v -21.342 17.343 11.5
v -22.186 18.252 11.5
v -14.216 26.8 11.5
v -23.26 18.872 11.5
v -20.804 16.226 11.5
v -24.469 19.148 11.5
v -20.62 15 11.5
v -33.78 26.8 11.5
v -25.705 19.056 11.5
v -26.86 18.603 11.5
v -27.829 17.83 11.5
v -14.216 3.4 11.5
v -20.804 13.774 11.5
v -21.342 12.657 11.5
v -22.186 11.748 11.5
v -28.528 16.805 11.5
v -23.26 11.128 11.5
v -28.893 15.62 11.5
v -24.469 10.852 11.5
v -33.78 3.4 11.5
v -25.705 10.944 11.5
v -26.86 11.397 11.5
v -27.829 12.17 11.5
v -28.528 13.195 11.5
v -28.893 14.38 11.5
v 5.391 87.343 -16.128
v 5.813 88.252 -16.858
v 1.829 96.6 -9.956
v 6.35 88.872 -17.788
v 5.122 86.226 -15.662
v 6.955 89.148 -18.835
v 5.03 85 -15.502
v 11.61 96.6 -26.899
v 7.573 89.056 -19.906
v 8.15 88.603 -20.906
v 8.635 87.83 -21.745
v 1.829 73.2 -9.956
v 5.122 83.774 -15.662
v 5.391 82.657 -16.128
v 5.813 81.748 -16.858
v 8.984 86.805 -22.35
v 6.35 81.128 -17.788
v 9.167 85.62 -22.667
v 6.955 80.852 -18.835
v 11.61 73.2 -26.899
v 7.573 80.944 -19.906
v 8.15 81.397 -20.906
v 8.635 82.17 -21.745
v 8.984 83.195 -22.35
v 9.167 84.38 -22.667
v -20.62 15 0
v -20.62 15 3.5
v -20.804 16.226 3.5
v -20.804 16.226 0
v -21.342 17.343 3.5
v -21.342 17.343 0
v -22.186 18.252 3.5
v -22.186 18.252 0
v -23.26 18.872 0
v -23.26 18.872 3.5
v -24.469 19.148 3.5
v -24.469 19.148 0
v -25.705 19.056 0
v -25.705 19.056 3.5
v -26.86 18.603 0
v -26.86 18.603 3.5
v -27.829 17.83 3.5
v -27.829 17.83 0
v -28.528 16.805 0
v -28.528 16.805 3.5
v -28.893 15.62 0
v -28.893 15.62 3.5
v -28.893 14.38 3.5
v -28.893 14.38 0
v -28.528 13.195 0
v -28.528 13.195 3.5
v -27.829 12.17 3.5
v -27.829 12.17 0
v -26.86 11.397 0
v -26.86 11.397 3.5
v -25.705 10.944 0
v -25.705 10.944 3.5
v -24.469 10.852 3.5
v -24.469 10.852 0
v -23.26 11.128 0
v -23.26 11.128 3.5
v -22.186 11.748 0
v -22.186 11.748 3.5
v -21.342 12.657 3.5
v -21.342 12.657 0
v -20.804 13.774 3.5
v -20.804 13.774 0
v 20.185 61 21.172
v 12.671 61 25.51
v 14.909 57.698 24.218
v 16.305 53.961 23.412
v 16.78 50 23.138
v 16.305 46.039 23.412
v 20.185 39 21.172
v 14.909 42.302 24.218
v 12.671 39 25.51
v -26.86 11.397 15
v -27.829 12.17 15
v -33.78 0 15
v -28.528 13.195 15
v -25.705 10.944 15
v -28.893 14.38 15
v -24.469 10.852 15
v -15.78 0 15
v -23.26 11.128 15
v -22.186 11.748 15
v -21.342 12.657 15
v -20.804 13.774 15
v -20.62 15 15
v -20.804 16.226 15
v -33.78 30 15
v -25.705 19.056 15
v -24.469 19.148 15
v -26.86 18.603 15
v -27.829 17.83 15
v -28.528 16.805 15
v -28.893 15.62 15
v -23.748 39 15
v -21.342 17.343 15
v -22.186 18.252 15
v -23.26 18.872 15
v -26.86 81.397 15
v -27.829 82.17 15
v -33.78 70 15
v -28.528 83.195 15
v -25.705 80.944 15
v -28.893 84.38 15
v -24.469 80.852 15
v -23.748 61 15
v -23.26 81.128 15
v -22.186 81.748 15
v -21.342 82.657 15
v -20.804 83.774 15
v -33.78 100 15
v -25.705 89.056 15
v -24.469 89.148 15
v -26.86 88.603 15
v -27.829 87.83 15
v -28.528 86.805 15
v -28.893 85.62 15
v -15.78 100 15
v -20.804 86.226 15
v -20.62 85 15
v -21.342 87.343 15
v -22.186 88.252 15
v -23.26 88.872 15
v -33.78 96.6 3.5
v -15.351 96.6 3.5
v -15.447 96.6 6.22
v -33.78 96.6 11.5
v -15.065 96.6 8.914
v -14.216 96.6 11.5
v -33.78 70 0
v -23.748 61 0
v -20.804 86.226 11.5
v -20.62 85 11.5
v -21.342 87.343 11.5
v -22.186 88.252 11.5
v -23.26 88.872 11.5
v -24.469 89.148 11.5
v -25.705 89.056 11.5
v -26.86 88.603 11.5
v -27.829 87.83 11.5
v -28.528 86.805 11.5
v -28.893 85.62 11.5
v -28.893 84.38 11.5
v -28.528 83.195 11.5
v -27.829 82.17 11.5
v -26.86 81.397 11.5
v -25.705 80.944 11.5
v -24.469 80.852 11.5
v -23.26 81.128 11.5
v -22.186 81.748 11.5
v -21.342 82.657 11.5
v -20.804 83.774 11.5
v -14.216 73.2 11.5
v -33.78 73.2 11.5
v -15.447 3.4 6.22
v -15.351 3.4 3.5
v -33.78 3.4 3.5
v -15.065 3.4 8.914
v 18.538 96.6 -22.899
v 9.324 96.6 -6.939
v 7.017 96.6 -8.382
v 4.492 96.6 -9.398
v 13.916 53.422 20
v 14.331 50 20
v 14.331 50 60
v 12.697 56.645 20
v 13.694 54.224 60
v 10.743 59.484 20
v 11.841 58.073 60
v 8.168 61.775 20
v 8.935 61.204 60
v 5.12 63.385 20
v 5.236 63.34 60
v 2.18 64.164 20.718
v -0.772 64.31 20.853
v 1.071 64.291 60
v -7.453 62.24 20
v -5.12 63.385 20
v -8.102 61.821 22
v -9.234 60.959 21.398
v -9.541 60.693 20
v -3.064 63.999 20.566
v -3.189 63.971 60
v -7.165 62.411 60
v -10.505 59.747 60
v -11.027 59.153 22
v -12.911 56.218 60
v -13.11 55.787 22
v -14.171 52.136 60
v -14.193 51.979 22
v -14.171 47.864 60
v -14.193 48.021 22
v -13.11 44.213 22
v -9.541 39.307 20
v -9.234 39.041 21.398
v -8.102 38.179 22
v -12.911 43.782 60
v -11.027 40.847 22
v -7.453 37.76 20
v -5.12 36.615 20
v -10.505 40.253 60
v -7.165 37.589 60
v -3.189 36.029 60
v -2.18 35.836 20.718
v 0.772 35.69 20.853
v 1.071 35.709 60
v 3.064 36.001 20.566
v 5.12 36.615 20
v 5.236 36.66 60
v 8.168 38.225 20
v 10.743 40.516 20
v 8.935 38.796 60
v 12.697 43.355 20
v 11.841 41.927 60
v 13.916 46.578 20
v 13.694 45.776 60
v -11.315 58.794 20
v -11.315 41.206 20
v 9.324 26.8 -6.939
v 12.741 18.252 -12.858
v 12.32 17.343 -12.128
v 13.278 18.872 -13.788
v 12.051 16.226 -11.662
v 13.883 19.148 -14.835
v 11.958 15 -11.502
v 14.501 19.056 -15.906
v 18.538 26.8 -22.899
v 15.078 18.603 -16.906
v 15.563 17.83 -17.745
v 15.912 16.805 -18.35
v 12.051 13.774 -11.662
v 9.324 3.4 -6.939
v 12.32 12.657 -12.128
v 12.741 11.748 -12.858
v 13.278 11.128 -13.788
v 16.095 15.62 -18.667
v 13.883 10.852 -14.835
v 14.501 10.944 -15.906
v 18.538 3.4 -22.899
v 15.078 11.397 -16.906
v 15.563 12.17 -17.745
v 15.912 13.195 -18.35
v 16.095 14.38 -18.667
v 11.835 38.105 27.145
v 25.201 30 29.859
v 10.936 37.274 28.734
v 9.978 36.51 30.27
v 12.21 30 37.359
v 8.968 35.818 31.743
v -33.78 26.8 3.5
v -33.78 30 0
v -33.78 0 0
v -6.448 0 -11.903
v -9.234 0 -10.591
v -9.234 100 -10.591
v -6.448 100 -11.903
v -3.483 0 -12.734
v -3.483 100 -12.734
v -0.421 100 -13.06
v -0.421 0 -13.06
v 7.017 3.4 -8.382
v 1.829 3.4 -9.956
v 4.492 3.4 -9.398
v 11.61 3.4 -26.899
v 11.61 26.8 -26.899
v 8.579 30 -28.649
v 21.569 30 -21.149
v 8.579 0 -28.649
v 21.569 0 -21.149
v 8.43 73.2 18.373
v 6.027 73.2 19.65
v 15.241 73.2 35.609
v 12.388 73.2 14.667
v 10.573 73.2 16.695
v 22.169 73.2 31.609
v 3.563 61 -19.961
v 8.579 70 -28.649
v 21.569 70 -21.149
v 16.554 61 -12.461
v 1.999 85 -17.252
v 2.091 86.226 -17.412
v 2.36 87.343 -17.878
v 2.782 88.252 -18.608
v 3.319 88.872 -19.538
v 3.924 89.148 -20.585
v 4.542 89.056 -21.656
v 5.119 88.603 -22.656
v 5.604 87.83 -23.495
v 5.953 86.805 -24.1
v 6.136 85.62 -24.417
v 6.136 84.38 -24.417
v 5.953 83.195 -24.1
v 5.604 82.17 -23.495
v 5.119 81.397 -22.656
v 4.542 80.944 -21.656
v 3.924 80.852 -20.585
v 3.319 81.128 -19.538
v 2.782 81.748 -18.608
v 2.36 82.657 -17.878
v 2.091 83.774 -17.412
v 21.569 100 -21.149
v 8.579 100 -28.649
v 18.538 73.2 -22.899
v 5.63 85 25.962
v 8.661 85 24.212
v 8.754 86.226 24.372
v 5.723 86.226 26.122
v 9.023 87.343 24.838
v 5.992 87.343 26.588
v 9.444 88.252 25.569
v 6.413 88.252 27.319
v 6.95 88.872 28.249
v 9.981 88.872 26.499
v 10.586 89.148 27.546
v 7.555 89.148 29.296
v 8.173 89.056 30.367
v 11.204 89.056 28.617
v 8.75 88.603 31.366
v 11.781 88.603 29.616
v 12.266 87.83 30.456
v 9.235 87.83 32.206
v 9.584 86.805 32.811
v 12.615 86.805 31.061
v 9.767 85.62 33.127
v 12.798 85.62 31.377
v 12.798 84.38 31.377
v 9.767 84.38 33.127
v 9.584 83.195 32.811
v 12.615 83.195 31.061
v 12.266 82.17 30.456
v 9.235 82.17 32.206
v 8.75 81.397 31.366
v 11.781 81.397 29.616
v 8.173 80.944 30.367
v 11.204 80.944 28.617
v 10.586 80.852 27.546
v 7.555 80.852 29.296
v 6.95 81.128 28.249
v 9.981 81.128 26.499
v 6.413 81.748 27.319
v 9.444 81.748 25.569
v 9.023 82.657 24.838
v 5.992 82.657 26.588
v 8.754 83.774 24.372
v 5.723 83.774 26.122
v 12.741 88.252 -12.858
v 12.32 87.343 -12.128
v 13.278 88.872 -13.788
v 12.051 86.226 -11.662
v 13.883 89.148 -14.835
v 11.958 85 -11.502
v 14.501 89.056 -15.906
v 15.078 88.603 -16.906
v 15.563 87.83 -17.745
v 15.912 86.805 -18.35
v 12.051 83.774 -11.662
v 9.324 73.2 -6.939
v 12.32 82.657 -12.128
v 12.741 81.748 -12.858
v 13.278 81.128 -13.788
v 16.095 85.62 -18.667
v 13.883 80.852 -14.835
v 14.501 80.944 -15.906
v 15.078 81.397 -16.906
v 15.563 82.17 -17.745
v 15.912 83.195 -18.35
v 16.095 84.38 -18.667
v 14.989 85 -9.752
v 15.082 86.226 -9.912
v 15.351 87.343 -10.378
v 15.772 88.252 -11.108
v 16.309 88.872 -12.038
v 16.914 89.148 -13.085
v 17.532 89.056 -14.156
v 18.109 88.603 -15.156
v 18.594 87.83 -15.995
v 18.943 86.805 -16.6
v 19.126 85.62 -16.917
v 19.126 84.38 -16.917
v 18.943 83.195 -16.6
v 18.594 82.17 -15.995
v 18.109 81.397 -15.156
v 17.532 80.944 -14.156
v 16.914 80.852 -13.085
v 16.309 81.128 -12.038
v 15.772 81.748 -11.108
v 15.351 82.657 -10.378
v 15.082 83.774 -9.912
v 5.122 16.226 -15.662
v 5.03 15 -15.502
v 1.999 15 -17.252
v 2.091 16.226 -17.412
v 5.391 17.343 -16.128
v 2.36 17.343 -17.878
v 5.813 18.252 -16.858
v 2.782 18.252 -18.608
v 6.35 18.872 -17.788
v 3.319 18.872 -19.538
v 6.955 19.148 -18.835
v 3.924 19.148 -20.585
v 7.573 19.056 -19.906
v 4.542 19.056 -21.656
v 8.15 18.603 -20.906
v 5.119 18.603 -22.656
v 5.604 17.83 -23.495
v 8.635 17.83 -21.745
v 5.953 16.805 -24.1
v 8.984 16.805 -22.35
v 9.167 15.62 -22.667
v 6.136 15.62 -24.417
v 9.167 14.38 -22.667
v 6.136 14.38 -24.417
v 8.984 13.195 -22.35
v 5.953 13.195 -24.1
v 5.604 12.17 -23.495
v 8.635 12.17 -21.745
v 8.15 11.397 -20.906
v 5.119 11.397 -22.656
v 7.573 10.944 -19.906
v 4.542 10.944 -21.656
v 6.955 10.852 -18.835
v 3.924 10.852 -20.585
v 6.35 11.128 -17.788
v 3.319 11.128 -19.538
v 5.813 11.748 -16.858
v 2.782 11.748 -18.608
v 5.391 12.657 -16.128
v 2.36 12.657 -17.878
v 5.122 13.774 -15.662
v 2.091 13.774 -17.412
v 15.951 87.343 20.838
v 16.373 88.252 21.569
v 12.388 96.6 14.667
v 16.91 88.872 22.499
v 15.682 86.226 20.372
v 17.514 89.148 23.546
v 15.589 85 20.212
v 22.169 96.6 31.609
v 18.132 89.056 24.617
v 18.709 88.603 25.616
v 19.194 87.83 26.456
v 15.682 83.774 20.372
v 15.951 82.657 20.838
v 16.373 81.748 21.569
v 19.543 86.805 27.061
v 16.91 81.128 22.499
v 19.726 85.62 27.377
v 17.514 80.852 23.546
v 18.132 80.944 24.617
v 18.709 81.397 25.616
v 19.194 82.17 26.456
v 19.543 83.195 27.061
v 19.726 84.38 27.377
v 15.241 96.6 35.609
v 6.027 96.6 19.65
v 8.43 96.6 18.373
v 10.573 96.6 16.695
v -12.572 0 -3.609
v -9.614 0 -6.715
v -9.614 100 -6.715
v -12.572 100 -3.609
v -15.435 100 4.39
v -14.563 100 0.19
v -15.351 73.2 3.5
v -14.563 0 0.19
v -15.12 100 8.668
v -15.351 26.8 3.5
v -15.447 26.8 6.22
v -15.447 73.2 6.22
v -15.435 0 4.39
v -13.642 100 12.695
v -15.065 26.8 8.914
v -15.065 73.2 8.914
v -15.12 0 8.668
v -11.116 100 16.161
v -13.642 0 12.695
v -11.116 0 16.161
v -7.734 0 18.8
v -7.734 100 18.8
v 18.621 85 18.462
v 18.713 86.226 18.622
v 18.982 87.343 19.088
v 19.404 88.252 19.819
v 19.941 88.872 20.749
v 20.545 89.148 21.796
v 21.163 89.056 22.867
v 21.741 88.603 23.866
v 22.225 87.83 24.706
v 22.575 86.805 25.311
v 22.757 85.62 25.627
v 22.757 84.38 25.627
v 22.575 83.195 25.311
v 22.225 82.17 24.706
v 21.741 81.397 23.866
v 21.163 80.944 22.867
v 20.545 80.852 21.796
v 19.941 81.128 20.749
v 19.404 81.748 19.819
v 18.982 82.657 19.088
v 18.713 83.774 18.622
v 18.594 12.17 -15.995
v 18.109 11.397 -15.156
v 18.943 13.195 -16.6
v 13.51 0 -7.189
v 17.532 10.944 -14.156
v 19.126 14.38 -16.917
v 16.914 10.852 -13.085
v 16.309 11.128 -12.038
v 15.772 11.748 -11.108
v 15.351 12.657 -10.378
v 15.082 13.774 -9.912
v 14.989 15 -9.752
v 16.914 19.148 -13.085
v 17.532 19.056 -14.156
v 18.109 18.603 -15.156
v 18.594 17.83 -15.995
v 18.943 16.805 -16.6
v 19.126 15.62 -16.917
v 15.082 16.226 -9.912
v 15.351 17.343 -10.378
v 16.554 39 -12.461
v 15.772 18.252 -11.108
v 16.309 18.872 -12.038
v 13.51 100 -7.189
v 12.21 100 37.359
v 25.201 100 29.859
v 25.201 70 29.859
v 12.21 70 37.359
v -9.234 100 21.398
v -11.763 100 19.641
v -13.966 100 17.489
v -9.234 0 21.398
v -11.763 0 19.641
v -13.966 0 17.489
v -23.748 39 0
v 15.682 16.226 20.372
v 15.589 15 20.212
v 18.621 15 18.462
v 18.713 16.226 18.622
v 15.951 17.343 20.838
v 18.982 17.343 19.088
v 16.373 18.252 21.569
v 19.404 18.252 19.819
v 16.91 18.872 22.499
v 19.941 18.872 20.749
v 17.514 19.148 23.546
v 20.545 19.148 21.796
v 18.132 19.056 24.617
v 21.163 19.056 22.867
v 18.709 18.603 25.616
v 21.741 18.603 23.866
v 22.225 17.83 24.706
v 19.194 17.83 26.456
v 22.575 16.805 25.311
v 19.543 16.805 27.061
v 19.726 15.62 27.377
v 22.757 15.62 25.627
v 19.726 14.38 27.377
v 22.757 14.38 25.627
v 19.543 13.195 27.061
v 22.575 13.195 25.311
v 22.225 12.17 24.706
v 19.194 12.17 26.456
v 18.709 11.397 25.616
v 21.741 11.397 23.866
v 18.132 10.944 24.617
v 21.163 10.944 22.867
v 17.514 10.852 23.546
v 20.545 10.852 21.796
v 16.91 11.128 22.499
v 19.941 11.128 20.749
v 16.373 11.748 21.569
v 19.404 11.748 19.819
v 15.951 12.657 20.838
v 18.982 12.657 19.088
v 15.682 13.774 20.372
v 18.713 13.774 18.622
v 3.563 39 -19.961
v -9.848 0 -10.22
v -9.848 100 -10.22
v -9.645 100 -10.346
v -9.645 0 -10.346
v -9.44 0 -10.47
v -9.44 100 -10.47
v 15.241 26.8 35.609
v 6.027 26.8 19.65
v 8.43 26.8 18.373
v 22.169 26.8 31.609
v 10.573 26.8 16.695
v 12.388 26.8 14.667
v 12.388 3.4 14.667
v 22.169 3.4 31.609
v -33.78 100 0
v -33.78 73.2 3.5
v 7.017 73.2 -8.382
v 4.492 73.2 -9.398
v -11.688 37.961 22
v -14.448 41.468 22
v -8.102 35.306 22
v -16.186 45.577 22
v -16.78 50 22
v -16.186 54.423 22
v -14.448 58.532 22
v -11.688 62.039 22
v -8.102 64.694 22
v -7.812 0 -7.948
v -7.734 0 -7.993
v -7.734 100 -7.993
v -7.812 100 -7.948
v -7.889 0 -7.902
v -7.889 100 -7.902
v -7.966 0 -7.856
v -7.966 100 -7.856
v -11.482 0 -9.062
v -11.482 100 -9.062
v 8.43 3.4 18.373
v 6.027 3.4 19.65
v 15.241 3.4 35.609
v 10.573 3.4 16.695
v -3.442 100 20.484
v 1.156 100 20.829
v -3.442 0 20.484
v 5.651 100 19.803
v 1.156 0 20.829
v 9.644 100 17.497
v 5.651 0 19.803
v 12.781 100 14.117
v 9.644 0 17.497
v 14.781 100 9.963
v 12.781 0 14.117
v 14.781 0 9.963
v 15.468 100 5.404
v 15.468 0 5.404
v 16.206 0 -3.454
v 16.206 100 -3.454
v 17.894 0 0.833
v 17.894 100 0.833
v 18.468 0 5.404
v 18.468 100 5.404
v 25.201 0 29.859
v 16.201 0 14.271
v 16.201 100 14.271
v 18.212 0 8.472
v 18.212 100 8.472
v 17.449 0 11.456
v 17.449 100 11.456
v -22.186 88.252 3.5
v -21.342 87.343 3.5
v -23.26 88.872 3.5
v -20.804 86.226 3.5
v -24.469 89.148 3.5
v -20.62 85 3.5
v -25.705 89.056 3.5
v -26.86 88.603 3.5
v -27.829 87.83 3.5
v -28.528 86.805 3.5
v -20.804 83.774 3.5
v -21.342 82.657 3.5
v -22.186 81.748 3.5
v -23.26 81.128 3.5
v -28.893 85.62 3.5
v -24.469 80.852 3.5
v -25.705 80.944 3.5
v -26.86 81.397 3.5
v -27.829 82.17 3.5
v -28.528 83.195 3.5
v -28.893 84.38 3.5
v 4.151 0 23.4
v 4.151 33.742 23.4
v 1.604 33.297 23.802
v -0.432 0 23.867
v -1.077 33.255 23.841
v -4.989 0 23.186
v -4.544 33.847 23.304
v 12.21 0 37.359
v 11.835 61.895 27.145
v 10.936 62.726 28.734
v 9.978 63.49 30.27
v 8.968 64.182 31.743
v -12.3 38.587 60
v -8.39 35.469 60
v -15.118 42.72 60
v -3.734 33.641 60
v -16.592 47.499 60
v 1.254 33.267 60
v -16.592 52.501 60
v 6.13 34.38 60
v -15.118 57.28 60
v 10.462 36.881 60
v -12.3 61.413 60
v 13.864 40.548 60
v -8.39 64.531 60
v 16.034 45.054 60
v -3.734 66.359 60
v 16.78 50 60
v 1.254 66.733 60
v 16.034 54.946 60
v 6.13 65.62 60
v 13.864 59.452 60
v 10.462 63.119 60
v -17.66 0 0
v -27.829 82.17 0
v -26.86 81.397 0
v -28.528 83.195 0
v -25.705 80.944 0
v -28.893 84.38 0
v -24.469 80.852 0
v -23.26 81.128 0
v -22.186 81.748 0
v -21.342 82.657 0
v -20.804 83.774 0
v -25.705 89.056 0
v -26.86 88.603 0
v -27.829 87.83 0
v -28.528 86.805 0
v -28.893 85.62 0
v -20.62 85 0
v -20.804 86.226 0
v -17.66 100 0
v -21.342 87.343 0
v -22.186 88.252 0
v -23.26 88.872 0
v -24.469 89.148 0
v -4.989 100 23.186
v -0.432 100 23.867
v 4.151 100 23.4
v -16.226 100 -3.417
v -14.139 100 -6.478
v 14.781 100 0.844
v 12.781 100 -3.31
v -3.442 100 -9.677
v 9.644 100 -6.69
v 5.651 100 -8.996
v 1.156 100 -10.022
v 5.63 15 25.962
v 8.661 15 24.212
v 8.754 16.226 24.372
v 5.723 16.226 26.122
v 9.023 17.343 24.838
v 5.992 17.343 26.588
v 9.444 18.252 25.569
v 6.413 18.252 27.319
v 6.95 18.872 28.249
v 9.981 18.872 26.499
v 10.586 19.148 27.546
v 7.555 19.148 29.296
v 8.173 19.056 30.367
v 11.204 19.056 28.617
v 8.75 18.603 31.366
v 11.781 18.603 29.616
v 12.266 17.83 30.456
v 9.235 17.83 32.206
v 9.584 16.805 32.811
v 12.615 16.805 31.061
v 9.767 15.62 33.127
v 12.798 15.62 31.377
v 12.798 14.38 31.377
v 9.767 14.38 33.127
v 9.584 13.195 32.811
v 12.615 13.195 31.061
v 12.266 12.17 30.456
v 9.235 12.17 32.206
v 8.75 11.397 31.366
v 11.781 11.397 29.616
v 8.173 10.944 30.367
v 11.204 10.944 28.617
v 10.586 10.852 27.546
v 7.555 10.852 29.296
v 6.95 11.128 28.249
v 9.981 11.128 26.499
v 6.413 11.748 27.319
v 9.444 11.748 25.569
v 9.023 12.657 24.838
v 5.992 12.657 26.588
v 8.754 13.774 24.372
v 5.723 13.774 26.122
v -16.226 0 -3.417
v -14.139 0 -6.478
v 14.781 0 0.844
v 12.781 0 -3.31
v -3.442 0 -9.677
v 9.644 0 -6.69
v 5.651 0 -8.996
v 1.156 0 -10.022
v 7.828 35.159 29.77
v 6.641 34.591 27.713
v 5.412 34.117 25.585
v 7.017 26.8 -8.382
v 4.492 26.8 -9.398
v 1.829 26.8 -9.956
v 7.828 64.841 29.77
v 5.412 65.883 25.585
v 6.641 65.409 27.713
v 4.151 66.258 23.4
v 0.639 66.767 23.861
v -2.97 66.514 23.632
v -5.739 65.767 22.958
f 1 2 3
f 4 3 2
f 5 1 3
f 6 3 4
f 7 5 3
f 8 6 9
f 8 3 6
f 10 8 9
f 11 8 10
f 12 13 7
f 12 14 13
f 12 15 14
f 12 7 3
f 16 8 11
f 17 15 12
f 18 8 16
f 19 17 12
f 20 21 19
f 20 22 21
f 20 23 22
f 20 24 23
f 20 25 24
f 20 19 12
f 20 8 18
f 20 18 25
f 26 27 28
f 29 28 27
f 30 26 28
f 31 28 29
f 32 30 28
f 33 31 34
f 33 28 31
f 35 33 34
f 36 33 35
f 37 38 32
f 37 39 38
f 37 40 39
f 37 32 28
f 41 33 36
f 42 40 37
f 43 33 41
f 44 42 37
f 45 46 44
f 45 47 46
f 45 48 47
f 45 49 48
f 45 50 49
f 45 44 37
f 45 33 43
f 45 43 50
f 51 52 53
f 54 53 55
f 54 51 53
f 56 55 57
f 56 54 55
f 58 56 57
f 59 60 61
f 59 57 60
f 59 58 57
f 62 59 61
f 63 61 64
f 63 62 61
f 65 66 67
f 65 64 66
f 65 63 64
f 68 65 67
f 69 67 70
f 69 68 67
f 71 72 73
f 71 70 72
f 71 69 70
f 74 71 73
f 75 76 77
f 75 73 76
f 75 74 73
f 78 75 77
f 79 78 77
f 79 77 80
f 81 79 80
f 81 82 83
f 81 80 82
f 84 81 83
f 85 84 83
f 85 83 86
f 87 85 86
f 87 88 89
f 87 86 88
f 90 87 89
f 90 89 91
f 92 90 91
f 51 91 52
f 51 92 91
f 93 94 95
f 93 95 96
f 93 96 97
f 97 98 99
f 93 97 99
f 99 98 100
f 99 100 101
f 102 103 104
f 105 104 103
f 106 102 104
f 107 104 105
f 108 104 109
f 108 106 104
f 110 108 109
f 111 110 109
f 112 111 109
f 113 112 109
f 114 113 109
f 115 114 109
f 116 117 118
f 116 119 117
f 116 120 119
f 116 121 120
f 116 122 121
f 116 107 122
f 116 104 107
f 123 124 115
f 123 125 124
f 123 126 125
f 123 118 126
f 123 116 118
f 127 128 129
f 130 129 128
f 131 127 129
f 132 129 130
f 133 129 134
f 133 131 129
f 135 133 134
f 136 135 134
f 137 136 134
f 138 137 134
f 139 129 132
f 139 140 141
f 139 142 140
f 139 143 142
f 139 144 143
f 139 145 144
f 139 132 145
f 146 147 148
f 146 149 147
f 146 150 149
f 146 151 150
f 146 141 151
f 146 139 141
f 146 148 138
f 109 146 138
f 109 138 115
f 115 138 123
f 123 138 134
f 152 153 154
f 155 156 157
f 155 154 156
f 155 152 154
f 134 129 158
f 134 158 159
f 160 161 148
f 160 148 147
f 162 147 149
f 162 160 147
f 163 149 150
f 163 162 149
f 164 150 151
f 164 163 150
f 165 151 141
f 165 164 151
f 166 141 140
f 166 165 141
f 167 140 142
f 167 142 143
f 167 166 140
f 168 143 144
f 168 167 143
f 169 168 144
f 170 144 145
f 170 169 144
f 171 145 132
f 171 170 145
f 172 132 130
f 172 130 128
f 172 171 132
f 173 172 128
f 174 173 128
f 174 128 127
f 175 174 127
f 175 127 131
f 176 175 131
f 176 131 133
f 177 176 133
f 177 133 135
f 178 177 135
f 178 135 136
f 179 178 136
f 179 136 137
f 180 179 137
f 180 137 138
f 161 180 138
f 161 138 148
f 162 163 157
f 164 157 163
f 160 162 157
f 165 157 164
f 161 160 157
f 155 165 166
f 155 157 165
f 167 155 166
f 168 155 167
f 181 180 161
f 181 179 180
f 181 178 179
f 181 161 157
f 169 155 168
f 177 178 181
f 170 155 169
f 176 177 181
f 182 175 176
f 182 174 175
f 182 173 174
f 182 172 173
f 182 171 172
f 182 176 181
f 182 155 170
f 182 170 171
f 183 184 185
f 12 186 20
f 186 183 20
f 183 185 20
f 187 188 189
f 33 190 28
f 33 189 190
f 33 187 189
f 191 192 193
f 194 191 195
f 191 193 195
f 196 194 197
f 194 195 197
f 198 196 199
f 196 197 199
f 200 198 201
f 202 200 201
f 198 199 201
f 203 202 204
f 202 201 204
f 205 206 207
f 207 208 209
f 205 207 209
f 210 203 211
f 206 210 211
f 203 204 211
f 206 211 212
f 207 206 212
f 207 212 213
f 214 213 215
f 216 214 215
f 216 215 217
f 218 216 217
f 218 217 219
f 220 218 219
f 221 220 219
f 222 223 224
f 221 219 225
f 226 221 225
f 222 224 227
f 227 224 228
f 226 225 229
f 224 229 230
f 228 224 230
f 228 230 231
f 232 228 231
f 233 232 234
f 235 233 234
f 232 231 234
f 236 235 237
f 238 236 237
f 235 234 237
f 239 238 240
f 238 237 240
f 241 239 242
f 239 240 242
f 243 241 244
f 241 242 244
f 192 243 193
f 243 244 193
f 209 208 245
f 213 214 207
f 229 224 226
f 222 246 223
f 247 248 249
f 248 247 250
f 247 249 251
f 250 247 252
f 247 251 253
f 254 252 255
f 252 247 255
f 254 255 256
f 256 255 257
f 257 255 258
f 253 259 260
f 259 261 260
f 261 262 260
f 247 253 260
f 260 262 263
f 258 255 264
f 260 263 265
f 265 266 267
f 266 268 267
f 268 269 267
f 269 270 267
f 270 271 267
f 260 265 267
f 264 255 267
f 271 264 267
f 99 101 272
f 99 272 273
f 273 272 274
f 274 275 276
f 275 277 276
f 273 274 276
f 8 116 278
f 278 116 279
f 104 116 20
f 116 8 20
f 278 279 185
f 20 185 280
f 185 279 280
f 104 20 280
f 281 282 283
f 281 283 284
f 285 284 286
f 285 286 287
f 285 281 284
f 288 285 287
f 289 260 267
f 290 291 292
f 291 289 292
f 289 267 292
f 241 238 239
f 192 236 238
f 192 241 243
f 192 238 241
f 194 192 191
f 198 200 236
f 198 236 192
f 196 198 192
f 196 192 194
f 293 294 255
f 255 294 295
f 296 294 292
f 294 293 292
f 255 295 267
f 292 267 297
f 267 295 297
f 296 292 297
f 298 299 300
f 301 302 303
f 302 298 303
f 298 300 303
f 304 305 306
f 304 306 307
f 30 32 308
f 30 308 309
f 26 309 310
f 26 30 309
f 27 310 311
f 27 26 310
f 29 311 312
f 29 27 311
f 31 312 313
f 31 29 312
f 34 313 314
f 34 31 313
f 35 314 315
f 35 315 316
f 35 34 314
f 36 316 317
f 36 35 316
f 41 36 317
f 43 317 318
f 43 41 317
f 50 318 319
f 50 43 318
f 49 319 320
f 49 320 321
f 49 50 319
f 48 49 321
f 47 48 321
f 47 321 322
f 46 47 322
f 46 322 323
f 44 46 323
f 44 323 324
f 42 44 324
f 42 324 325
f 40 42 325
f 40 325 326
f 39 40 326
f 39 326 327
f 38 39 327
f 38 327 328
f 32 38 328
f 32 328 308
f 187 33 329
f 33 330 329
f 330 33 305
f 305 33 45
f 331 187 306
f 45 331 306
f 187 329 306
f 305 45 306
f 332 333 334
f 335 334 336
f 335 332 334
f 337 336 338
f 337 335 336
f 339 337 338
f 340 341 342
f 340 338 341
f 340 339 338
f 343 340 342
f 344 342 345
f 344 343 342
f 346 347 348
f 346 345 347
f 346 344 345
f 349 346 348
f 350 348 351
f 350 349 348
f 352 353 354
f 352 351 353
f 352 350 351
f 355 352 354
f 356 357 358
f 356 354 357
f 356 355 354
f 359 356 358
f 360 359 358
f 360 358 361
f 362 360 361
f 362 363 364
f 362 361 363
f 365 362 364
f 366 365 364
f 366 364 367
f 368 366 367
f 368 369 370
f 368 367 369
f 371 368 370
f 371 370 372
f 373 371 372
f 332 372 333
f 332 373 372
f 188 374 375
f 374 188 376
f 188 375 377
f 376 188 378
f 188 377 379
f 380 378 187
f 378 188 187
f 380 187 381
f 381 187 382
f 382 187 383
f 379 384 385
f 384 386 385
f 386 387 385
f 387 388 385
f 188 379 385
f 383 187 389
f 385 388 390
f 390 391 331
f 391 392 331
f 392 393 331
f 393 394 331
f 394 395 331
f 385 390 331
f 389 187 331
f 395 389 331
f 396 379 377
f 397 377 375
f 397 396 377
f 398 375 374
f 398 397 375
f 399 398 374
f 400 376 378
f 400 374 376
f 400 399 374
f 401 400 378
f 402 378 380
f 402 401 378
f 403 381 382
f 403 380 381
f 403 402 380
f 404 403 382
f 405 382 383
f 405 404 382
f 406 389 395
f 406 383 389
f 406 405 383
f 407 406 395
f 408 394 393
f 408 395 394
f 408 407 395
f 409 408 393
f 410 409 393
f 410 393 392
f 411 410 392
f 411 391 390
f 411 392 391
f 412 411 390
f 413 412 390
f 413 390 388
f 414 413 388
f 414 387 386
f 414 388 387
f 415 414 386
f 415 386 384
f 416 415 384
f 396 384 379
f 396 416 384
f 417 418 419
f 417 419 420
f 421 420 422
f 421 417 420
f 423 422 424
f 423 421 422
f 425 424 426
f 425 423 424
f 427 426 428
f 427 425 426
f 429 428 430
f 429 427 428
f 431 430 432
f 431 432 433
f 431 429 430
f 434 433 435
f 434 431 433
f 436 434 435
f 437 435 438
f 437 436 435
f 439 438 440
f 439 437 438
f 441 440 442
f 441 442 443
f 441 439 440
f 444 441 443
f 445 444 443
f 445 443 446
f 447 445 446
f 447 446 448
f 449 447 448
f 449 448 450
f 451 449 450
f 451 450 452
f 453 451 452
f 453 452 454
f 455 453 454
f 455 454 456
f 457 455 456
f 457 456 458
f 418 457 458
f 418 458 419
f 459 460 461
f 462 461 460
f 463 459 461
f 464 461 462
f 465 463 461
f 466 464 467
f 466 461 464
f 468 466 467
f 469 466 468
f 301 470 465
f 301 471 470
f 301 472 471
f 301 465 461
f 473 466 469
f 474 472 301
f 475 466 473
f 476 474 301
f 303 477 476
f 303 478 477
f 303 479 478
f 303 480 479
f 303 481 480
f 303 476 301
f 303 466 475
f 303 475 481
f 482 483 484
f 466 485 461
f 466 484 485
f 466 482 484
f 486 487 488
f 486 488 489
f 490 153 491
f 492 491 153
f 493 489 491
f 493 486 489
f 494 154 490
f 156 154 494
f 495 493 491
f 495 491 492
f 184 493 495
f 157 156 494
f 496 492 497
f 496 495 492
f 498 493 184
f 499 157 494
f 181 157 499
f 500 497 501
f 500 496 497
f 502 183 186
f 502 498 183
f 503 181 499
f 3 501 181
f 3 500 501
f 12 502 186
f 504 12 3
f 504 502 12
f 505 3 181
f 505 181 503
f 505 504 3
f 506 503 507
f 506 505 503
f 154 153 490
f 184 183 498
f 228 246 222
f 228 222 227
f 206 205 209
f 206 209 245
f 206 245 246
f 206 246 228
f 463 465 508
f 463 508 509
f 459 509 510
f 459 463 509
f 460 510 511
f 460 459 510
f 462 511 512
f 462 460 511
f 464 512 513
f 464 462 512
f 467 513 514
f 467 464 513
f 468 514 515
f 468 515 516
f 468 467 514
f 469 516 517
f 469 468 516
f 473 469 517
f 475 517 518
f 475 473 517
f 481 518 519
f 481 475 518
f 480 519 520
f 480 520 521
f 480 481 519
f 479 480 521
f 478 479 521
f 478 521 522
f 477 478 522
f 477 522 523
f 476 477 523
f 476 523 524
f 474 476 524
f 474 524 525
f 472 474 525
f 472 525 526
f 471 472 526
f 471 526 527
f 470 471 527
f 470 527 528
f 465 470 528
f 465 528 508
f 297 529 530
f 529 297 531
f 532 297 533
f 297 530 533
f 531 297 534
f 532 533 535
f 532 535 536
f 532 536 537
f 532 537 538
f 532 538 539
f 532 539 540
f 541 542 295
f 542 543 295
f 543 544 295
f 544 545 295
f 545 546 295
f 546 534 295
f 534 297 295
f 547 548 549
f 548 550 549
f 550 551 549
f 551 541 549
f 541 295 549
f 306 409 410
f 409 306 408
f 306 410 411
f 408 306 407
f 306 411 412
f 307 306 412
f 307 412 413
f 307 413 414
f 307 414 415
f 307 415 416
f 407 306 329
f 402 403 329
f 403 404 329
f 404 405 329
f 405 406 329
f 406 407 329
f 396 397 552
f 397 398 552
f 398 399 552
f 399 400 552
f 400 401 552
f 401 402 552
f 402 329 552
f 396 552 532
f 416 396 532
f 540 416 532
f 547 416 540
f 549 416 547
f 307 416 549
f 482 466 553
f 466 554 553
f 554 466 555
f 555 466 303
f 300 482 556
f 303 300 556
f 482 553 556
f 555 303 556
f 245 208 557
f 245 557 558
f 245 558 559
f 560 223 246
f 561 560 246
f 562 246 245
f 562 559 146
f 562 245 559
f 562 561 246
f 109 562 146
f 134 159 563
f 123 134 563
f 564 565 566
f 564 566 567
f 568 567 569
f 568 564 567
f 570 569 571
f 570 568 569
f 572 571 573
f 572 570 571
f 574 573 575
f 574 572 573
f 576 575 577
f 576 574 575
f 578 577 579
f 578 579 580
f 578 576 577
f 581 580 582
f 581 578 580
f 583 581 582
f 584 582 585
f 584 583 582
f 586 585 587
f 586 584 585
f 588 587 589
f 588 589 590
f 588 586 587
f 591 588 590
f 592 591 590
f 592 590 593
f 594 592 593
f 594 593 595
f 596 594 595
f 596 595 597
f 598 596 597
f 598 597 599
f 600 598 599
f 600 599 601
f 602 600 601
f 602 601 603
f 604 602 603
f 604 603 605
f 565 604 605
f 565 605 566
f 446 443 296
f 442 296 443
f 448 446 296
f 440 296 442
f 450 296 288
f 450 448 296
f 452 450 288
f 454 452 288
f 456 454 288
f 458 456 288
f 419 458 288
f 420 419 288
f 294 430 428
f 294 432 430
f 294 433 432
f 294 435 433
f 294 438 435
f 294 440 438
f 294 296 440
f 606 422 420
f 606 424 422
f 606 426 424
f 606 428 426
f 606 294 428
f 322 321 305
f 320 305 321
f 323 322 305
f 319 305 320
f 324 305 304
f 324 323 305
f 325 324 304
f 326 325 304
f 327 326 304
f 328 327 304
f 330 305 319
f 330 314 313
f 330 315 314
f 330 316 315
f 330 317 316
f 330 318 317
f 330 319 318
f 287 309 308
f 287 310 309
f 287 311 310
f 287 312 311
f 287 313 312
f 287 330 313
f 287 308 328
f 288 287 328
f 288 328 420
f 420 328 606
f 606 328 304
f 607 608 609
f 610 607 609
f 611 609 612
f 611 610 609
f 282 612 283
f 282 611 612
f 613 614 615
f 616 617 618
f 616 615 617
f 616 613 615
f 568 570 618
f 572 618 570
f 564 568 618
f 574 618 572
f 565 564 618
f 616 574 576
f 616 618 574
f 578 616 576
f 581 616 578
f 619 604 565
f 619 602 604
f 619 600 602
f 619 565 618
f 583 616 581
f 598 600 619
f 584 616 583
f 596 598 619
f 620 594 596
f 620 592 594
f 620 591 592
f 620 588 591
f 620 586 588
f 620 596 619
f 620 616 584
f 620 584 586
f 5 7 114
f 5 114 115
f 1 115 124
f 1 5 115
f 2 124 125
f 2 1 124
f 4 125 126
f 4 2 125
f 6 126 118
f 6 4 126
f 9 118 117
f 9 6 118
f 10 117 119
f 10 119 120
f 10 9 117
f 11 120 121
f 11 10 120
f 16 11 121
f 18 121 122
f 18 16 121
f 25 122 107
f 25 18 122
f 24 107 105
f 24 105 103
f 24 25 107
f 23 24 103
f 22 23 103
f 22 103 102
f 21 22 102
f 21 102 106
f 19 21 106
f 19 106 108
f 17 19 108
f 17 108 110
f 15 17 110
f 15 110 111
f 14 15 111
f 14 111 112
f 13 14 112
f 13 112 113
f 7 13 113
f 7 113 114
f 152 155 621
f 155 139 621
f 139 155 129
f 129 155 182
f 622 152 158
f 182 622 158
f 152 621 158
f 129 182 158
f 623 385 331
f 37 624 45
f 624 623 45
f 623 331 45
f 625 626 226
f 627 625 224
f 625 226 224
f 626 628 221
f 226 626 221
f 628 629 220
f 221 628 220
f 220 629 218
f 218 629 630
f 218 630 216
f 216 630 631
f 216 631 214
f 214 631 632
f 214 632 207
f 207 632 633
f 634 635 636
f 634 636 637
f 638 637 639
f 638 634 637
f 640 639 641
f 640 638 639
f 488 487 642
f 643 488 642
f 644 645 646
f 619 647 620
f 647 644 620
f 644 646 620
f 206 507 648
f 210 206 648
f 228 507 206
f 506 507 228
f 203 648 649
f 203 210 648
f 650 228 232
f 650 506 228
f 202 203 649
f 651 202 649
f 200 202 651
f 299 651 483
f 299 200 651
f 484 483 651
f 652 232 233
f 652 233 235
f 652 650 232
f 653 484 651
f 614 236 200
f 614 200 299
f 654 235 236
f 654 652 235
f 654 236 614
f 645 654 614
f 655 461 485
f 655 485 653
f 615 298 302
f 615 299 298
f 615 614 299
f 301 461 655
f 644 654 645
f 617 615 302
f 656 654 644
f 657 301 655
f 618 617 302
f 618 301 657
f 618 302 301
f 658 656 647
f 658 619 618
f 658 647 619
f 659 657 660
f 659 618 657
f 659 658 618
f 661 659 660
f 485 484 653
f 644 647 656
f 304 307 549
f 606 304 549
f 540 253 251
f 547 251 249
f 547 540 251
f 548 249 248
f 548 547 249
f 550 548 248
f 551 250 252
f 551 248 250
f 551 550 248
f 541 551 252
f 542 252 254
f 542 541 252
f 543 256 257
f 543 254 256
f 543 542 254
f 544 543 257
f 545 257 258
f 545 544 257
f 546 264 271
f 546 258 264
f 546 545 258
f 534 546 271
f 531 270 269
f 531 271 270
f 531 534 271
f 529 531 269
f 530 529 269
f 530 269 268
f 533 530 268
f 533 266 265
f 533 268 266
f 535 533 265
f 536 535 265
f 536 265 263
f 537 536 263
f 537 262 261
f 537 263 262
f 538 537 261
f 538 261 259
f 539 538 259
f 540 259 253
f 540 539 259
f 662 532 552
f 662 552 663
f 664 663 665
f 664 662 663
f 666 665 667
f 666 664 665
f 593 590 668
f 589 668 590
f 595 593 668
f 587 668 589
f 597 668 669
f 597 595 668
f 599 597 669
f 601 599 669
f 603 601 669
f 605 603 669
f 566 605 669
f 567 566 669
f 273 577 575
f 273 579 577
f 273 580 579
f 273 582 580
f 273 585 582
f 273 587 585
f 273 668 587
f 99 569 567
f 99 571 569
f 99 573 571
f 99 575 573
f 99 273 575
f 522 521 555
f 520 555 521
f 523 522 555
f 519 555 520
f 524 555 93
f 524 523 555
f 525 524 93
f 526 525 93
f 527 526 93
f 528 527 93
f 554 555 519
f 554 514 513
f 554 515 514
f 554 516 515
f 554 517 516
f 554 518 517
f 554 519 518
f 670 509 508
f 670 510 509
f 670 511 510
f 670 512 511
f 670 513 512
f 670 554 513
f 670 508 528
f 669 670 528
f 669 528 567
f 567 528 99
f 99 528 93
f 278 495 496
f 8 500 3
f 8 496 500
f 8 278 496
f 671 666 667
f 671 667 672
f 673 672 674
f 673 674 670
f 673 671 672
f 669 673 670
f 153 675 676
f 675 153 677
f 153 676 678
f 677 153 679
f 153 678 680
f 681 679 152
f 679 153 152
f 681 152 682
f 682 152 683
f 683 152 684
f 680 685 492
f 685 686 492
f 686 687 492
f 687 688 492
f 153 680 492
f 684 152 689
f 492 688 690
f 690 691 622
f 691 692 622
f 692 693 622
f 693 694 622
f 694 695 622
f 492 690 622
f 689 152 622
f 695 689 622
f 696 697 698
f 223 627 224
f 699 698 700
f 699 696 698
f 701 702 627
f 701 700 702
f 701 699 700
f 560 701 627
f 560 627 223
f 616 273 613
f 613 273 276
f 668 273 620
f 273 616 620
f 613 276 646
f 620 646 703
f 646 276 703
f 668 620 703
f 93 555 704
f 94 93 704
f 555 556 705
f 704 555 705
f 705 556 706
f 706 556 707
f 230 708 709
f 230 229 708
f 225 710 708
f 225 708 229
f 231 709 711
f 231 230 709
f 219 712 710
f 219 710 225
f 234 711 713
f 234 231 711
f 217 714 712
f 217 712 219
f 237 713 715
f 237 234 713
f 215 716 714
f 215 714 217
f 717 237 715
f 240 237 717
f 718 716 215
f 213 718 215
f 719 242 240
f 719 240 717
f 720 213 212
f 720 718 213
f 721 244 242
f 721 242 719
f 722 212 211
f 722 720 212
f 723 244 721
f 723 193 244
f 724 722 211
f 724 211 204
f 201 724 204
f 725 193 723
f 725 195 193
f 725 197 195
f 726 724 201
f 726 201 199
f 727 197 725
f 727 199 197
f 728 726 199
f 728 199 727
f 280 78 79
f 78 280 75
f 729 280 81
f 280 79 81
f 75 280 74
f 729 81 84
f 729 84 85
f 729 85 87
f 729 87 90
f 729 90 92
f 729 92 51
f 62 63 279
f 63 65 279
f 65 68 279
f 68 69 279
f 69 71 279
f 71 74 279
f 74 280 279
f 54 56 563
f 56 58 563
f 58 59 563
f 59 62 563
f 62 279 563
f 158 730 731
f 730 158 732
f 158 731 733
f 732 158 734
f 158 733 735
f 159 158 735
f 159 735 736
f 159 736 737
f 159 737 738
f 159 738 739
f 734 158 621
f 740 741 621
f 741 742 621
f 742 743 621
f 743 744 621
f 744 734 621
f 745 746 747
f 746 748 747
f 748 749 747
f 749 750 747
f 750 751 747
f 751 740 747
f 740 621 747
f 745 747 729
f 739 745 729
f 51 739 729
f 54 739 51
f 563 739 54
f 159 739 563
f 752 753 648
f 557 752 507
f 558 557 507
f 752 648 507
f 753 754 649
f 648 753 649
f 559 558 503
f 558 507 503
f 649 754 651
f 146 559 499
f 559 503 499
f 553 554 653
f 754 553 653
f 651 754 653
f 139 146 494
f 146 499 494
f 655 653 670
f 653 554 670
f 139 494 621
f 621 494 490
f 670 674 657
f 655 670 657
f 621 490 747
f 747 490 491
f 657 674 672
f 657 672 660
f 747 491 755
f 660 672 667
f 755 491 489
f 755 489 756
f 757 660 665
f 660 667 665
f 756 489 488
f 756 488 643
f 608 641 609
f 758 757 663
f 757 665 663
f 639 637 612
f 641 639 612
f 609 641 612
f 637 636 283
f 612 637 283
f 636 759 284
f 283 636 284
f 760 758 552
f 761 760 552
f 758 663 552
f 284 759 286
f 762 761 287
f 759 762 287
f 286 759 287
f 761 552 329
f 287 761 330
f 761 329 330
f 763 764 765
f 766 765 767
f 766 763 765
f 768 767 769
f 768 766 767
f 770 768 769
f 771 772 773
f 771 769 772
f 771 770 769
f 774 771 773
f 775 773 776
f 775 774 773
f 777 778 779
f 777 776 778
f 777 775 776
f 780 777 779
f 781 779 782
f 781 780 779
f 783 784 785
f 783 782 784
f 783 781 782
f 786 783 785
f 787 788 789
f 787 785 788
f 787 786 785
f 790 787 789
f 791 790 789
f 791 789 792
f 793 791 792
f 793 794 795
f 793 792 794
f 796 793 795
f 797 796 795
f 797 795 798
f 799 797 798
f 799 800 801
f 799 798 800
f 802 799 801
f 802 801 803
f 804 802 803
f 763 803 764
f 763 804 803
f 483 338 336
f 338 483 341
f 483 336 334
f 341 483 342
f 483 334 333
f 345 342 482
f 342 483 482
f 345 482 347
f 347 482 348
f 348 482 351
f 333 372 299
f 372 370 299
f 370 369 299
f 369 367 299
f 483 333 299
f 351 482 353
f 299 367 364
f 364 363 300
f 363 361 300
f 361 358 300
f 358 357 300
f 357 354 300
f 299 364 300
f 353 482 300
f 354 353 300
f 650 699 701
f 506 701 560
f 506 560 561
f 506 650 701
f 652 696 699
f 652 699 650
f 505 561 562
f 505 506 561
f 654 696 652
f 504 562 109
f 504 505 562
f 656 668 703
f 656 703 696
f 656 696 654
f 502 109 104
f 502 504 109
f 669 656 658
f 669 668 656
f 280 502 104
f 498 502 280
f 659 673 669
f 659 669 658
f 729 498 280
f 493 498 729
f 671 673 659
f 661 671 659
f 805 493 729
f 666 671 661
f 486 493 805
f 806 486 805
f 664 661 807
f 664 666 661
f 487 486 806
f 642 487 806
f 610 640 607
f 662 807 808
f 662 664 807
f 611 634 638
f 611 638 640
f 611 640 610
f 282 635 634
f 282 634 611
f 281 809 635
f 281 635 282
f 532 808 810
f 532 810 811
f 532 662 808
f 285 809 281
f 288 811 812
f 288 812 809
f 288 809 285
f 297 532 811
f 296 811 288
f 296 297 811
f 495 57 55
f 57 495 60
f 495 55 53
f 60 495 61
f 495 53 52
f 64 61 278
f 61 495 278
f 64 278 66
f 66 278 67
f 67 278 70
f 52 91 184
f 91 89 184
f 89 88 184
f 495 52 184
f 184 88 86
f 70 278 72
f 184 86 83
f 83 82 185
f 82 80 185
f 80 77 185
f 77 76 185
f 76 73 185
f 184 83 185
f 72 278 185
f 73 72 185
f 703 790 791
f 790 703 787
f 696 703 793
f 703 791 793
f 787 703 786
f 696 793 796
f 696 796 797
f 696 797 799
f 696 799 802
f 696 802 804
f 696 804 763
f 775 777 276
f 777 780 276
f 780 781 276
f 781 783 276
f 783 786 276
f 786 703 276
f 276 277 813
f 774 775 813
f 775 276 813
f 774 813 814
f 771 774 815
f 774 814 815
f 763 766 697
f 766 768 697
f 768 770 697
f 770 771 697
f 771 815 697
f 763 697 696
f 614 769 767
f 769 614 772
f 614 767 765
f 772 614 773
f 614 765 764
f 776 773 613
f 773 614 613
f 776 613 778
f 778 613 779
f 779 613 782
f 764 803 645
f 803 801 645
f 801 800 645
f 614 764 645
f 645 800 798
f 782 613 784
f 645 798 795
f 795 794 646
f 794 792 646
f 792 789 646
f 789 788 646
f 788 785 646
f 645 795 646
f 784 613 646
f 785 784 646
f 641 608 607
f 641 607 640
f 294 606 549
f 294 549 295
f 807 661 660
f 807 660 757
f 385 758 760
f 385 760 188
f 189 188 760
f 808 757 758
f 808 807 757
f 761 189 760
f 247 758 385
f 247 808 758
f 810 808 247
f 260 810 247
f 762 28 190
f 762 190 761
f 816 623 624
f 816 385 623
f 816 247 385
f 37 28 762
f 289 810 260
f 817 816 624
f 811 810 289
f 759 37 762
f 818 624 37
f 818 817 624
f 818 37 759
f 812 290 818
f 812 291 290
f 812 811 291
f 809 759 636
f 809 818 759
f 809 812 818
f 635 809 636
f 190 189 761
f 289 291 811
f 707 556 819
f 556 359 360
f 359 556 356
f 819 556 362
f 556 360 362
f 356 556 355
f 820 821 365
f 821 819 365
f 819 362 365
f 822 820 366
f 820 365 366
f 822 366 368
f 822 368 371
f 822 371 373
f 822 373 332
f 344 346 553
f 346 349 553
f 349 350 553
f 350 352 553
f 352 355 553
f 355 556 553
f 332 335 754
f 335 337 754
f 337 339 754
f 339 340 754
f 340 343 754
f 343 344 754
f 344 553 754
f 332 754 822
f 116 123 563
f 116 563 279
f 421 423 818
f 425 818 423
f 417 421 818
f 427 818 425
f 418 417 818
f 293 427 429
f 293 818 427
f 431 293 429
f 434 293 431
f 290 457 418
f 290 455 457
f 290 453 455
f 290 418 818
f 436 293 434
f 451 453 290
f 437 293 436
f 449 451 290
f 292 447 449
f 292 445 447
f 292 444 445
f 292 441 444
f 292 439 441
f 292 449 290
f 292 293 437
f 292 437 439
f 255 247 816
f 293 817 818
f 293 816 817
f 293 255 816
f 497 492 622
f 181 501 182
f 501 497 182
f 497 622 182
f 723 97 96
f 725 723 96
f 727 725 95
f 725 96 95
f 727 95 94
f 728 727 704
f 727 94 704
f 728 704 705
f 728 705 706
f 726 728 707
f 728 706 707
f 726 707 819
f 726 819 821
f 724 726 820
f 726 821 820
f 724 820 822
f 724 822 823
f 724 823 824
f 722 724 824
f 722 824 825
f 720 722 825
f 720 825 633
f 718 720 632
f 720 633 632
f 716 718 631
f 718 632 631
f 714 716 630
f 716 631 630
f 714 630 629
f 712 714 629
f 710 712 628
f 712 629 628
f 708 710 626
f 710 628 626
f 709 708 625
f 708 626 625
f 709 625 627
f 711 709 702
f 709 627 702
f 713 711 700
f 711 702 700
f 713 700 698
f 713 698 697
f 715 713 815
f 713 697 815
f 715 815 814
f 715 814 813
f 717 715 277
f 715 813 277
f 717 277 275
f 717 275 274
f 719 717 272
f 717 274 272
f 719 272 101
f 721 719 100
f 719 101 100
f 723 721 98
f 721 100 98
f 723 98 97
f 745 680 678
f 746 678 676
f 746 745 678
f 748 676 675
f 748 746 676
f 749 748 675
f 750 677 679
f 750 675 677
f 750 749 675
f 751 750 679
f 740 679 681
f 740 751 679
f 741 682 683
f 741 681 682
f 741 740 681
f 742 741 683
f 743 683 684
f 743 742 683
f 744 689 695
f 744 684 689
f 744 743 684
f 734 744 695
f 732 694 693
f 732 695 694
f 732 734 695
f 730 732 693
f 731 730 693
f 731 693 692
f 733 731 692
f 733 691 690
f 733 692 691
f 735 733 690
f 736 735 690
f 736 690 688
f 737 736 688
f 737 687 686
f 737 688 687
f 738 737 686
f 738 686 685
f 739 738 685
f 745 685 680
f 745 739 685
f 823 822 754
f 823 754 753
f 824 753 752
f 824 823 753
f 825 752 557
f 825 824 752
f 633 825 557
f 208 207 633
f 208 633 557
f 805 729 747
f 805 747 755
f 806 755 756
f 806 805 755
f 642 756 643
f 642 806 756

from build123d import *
from build123d import SkipClean  # not in build123d's __all__

# Parameters (mm, degrees)
F0_R      = 4.16
F1_DEPTH  = 15
F3_DEPTH  = 100
F4_W      = 23.4
F4_H      = 8
F5_DEPTH  = 25
F7_COUNT  = 3
F9_START  = 22
F8_R      = 16.7795
F8_R_2    = 13.7795
F9_DEPTH  = 38
F10_R     = 13.7795
F11_DEPTH = 40
F12_R     = 14.33068
F12_R_2   = 13.7795
F13_DEPTH = 40
F15_DEPTH = 100


# Not quite as in the source:
# - a feature names something its author has since deleted; it is built from what else it names


with BuildPart() as f1:
    # F0 (on Top) → F1 (new body)
    with BuildSketch(Plane.XY):
        Polygon((-33.7795, 0), (-15.7795, 0), (-15.7795, 50), (-15.7795, 100), (-33.7795, 100), (-33.7795, 70), (-23.7483102828, 61), (-23.7483102828, 50), (-23.7483102828, 39), (-33.7795, 30), align=None)
        with Locations((-24.7795, 15)):
            Circle(F0_R, mode=Mode.SUBTRACT)
        with Locations((-24.7795, 85)):
            Circle(F0_R, mode=Mode.SUBTRACT)
    extrude(amount=F1_DEPTH)

    # F2 (on face) → F3 (join)
    with BuildSketch(Plane.XZ):
        with BuildLine():
            ThreePointArc((-7.7342375, -7.9925473083), (-15.468475, 5.4035449996), (-7.7342375, 18.7996373074))
            Line((-7.7342375, 18.7996373074), (-9.2342375, 21.3977135187))
            ThreePointArc((-9.2342375, 21.3977135187), (-12.9094713485, 18.6107444881), (-15.7795, 15))
            Line((-15.7795, 15), (-15.7795, 0))
            Line((-15.7795, 0), (-17.6603021, 0))
            ThreePointArc((-17.6603021, 0), (-14.4523144066, -6.0949408624), (-9.2342375, -10.5906235196))
            Line((-9.2342375, -10.5906235196), (-7.7342375, -7.9925473083))
        make_face()
    extrude(amount=-F3_DEPTH)

    # F4 (on face) → F5 (cut)
    with BuildSketch(Plane(origin=(-33.7795, 0, 0), x_dir=(0, -1, 0), z_dir=(-1, 0, 0))):
        with Locations((-84.9, 7.5)):
            Rectangle(F4_W, F4_H)
        with Locations((-15.1, 7.5)):
            Rectangle(F4_W, F4_H)
    extrude(amount=-F5_DEPTH, mode=Mode.SUBTRACT)

    # F7: F1 ×3 about axis
    f7_axis = Axis((0, 0, 5.4035449996), (0, -1, 0))


with BuildPart() as f1_1:
    add(f1.part, clean=False)
    with SkipClean():  # cleaning this boolean's faces spoils the solid; the shape is the same uncleaned
        for i in range(1, F7_COUNT):
            add(f1.part.rotate(f7_axis, i * 360 / F7_COUNT), clean=False)

    # F8 (on Top) → F9 (join)
    with BuildSketch(Plane.XY.offset(F9_START)):
        with Locations((0, 50)):
            Circle(F8_R)
        with Locations((0, 50)):
            Circle(F8_R_2, mode=Mode.SUBTRACT)
    with SkipClean():  # cleaning this boolean's faces spoils the solid; the shape is the same uncleaned
        extrude(amount=F9_DEPTH)

    # F10 (on face) → F11 (cut)
    with BuildSketch(Plane.XY.offset(60)):
        with Locations((0, 50)):
            Circle(F10_R)
    with SkipClean():  # cleaning this boolean's faces spoils the solid; the shape is the same uncleaned
        extrude(amount=-F11_DEPTH, mode=Mode.SUBTRACT)

    # F12 (on face) → F13 (cut)
    with BuildSketch(Plane.XY.offset(60)):
        with Locations((0, 50)):
            Circle(F12_R)
        with Locations((0, 50)):
            Circle(F12_R_2, mode=Mode.SUBTRACT)
    with SkipClean():  # cleaning this boolean's faces spoils the solid; the shape is the same uncleaned
        extrude(amount=-F13_DEPTH, mode=Mode.SUBTRACT)

    # F14 (on Front) → F15 (cut)
    with BuildSketch(Plane.XZ):
        Polygon((-4.9232800736, -4.035219008), (-6.6853797605, -3.0374381485), (-13.2133684748, -11.2353765363), (-11.6488082544, -12.4812301861), align=None)
    extrude(amount=-F15_DEPTH, mode=Mode.SUBTRACT)


solid = f1_1.part
